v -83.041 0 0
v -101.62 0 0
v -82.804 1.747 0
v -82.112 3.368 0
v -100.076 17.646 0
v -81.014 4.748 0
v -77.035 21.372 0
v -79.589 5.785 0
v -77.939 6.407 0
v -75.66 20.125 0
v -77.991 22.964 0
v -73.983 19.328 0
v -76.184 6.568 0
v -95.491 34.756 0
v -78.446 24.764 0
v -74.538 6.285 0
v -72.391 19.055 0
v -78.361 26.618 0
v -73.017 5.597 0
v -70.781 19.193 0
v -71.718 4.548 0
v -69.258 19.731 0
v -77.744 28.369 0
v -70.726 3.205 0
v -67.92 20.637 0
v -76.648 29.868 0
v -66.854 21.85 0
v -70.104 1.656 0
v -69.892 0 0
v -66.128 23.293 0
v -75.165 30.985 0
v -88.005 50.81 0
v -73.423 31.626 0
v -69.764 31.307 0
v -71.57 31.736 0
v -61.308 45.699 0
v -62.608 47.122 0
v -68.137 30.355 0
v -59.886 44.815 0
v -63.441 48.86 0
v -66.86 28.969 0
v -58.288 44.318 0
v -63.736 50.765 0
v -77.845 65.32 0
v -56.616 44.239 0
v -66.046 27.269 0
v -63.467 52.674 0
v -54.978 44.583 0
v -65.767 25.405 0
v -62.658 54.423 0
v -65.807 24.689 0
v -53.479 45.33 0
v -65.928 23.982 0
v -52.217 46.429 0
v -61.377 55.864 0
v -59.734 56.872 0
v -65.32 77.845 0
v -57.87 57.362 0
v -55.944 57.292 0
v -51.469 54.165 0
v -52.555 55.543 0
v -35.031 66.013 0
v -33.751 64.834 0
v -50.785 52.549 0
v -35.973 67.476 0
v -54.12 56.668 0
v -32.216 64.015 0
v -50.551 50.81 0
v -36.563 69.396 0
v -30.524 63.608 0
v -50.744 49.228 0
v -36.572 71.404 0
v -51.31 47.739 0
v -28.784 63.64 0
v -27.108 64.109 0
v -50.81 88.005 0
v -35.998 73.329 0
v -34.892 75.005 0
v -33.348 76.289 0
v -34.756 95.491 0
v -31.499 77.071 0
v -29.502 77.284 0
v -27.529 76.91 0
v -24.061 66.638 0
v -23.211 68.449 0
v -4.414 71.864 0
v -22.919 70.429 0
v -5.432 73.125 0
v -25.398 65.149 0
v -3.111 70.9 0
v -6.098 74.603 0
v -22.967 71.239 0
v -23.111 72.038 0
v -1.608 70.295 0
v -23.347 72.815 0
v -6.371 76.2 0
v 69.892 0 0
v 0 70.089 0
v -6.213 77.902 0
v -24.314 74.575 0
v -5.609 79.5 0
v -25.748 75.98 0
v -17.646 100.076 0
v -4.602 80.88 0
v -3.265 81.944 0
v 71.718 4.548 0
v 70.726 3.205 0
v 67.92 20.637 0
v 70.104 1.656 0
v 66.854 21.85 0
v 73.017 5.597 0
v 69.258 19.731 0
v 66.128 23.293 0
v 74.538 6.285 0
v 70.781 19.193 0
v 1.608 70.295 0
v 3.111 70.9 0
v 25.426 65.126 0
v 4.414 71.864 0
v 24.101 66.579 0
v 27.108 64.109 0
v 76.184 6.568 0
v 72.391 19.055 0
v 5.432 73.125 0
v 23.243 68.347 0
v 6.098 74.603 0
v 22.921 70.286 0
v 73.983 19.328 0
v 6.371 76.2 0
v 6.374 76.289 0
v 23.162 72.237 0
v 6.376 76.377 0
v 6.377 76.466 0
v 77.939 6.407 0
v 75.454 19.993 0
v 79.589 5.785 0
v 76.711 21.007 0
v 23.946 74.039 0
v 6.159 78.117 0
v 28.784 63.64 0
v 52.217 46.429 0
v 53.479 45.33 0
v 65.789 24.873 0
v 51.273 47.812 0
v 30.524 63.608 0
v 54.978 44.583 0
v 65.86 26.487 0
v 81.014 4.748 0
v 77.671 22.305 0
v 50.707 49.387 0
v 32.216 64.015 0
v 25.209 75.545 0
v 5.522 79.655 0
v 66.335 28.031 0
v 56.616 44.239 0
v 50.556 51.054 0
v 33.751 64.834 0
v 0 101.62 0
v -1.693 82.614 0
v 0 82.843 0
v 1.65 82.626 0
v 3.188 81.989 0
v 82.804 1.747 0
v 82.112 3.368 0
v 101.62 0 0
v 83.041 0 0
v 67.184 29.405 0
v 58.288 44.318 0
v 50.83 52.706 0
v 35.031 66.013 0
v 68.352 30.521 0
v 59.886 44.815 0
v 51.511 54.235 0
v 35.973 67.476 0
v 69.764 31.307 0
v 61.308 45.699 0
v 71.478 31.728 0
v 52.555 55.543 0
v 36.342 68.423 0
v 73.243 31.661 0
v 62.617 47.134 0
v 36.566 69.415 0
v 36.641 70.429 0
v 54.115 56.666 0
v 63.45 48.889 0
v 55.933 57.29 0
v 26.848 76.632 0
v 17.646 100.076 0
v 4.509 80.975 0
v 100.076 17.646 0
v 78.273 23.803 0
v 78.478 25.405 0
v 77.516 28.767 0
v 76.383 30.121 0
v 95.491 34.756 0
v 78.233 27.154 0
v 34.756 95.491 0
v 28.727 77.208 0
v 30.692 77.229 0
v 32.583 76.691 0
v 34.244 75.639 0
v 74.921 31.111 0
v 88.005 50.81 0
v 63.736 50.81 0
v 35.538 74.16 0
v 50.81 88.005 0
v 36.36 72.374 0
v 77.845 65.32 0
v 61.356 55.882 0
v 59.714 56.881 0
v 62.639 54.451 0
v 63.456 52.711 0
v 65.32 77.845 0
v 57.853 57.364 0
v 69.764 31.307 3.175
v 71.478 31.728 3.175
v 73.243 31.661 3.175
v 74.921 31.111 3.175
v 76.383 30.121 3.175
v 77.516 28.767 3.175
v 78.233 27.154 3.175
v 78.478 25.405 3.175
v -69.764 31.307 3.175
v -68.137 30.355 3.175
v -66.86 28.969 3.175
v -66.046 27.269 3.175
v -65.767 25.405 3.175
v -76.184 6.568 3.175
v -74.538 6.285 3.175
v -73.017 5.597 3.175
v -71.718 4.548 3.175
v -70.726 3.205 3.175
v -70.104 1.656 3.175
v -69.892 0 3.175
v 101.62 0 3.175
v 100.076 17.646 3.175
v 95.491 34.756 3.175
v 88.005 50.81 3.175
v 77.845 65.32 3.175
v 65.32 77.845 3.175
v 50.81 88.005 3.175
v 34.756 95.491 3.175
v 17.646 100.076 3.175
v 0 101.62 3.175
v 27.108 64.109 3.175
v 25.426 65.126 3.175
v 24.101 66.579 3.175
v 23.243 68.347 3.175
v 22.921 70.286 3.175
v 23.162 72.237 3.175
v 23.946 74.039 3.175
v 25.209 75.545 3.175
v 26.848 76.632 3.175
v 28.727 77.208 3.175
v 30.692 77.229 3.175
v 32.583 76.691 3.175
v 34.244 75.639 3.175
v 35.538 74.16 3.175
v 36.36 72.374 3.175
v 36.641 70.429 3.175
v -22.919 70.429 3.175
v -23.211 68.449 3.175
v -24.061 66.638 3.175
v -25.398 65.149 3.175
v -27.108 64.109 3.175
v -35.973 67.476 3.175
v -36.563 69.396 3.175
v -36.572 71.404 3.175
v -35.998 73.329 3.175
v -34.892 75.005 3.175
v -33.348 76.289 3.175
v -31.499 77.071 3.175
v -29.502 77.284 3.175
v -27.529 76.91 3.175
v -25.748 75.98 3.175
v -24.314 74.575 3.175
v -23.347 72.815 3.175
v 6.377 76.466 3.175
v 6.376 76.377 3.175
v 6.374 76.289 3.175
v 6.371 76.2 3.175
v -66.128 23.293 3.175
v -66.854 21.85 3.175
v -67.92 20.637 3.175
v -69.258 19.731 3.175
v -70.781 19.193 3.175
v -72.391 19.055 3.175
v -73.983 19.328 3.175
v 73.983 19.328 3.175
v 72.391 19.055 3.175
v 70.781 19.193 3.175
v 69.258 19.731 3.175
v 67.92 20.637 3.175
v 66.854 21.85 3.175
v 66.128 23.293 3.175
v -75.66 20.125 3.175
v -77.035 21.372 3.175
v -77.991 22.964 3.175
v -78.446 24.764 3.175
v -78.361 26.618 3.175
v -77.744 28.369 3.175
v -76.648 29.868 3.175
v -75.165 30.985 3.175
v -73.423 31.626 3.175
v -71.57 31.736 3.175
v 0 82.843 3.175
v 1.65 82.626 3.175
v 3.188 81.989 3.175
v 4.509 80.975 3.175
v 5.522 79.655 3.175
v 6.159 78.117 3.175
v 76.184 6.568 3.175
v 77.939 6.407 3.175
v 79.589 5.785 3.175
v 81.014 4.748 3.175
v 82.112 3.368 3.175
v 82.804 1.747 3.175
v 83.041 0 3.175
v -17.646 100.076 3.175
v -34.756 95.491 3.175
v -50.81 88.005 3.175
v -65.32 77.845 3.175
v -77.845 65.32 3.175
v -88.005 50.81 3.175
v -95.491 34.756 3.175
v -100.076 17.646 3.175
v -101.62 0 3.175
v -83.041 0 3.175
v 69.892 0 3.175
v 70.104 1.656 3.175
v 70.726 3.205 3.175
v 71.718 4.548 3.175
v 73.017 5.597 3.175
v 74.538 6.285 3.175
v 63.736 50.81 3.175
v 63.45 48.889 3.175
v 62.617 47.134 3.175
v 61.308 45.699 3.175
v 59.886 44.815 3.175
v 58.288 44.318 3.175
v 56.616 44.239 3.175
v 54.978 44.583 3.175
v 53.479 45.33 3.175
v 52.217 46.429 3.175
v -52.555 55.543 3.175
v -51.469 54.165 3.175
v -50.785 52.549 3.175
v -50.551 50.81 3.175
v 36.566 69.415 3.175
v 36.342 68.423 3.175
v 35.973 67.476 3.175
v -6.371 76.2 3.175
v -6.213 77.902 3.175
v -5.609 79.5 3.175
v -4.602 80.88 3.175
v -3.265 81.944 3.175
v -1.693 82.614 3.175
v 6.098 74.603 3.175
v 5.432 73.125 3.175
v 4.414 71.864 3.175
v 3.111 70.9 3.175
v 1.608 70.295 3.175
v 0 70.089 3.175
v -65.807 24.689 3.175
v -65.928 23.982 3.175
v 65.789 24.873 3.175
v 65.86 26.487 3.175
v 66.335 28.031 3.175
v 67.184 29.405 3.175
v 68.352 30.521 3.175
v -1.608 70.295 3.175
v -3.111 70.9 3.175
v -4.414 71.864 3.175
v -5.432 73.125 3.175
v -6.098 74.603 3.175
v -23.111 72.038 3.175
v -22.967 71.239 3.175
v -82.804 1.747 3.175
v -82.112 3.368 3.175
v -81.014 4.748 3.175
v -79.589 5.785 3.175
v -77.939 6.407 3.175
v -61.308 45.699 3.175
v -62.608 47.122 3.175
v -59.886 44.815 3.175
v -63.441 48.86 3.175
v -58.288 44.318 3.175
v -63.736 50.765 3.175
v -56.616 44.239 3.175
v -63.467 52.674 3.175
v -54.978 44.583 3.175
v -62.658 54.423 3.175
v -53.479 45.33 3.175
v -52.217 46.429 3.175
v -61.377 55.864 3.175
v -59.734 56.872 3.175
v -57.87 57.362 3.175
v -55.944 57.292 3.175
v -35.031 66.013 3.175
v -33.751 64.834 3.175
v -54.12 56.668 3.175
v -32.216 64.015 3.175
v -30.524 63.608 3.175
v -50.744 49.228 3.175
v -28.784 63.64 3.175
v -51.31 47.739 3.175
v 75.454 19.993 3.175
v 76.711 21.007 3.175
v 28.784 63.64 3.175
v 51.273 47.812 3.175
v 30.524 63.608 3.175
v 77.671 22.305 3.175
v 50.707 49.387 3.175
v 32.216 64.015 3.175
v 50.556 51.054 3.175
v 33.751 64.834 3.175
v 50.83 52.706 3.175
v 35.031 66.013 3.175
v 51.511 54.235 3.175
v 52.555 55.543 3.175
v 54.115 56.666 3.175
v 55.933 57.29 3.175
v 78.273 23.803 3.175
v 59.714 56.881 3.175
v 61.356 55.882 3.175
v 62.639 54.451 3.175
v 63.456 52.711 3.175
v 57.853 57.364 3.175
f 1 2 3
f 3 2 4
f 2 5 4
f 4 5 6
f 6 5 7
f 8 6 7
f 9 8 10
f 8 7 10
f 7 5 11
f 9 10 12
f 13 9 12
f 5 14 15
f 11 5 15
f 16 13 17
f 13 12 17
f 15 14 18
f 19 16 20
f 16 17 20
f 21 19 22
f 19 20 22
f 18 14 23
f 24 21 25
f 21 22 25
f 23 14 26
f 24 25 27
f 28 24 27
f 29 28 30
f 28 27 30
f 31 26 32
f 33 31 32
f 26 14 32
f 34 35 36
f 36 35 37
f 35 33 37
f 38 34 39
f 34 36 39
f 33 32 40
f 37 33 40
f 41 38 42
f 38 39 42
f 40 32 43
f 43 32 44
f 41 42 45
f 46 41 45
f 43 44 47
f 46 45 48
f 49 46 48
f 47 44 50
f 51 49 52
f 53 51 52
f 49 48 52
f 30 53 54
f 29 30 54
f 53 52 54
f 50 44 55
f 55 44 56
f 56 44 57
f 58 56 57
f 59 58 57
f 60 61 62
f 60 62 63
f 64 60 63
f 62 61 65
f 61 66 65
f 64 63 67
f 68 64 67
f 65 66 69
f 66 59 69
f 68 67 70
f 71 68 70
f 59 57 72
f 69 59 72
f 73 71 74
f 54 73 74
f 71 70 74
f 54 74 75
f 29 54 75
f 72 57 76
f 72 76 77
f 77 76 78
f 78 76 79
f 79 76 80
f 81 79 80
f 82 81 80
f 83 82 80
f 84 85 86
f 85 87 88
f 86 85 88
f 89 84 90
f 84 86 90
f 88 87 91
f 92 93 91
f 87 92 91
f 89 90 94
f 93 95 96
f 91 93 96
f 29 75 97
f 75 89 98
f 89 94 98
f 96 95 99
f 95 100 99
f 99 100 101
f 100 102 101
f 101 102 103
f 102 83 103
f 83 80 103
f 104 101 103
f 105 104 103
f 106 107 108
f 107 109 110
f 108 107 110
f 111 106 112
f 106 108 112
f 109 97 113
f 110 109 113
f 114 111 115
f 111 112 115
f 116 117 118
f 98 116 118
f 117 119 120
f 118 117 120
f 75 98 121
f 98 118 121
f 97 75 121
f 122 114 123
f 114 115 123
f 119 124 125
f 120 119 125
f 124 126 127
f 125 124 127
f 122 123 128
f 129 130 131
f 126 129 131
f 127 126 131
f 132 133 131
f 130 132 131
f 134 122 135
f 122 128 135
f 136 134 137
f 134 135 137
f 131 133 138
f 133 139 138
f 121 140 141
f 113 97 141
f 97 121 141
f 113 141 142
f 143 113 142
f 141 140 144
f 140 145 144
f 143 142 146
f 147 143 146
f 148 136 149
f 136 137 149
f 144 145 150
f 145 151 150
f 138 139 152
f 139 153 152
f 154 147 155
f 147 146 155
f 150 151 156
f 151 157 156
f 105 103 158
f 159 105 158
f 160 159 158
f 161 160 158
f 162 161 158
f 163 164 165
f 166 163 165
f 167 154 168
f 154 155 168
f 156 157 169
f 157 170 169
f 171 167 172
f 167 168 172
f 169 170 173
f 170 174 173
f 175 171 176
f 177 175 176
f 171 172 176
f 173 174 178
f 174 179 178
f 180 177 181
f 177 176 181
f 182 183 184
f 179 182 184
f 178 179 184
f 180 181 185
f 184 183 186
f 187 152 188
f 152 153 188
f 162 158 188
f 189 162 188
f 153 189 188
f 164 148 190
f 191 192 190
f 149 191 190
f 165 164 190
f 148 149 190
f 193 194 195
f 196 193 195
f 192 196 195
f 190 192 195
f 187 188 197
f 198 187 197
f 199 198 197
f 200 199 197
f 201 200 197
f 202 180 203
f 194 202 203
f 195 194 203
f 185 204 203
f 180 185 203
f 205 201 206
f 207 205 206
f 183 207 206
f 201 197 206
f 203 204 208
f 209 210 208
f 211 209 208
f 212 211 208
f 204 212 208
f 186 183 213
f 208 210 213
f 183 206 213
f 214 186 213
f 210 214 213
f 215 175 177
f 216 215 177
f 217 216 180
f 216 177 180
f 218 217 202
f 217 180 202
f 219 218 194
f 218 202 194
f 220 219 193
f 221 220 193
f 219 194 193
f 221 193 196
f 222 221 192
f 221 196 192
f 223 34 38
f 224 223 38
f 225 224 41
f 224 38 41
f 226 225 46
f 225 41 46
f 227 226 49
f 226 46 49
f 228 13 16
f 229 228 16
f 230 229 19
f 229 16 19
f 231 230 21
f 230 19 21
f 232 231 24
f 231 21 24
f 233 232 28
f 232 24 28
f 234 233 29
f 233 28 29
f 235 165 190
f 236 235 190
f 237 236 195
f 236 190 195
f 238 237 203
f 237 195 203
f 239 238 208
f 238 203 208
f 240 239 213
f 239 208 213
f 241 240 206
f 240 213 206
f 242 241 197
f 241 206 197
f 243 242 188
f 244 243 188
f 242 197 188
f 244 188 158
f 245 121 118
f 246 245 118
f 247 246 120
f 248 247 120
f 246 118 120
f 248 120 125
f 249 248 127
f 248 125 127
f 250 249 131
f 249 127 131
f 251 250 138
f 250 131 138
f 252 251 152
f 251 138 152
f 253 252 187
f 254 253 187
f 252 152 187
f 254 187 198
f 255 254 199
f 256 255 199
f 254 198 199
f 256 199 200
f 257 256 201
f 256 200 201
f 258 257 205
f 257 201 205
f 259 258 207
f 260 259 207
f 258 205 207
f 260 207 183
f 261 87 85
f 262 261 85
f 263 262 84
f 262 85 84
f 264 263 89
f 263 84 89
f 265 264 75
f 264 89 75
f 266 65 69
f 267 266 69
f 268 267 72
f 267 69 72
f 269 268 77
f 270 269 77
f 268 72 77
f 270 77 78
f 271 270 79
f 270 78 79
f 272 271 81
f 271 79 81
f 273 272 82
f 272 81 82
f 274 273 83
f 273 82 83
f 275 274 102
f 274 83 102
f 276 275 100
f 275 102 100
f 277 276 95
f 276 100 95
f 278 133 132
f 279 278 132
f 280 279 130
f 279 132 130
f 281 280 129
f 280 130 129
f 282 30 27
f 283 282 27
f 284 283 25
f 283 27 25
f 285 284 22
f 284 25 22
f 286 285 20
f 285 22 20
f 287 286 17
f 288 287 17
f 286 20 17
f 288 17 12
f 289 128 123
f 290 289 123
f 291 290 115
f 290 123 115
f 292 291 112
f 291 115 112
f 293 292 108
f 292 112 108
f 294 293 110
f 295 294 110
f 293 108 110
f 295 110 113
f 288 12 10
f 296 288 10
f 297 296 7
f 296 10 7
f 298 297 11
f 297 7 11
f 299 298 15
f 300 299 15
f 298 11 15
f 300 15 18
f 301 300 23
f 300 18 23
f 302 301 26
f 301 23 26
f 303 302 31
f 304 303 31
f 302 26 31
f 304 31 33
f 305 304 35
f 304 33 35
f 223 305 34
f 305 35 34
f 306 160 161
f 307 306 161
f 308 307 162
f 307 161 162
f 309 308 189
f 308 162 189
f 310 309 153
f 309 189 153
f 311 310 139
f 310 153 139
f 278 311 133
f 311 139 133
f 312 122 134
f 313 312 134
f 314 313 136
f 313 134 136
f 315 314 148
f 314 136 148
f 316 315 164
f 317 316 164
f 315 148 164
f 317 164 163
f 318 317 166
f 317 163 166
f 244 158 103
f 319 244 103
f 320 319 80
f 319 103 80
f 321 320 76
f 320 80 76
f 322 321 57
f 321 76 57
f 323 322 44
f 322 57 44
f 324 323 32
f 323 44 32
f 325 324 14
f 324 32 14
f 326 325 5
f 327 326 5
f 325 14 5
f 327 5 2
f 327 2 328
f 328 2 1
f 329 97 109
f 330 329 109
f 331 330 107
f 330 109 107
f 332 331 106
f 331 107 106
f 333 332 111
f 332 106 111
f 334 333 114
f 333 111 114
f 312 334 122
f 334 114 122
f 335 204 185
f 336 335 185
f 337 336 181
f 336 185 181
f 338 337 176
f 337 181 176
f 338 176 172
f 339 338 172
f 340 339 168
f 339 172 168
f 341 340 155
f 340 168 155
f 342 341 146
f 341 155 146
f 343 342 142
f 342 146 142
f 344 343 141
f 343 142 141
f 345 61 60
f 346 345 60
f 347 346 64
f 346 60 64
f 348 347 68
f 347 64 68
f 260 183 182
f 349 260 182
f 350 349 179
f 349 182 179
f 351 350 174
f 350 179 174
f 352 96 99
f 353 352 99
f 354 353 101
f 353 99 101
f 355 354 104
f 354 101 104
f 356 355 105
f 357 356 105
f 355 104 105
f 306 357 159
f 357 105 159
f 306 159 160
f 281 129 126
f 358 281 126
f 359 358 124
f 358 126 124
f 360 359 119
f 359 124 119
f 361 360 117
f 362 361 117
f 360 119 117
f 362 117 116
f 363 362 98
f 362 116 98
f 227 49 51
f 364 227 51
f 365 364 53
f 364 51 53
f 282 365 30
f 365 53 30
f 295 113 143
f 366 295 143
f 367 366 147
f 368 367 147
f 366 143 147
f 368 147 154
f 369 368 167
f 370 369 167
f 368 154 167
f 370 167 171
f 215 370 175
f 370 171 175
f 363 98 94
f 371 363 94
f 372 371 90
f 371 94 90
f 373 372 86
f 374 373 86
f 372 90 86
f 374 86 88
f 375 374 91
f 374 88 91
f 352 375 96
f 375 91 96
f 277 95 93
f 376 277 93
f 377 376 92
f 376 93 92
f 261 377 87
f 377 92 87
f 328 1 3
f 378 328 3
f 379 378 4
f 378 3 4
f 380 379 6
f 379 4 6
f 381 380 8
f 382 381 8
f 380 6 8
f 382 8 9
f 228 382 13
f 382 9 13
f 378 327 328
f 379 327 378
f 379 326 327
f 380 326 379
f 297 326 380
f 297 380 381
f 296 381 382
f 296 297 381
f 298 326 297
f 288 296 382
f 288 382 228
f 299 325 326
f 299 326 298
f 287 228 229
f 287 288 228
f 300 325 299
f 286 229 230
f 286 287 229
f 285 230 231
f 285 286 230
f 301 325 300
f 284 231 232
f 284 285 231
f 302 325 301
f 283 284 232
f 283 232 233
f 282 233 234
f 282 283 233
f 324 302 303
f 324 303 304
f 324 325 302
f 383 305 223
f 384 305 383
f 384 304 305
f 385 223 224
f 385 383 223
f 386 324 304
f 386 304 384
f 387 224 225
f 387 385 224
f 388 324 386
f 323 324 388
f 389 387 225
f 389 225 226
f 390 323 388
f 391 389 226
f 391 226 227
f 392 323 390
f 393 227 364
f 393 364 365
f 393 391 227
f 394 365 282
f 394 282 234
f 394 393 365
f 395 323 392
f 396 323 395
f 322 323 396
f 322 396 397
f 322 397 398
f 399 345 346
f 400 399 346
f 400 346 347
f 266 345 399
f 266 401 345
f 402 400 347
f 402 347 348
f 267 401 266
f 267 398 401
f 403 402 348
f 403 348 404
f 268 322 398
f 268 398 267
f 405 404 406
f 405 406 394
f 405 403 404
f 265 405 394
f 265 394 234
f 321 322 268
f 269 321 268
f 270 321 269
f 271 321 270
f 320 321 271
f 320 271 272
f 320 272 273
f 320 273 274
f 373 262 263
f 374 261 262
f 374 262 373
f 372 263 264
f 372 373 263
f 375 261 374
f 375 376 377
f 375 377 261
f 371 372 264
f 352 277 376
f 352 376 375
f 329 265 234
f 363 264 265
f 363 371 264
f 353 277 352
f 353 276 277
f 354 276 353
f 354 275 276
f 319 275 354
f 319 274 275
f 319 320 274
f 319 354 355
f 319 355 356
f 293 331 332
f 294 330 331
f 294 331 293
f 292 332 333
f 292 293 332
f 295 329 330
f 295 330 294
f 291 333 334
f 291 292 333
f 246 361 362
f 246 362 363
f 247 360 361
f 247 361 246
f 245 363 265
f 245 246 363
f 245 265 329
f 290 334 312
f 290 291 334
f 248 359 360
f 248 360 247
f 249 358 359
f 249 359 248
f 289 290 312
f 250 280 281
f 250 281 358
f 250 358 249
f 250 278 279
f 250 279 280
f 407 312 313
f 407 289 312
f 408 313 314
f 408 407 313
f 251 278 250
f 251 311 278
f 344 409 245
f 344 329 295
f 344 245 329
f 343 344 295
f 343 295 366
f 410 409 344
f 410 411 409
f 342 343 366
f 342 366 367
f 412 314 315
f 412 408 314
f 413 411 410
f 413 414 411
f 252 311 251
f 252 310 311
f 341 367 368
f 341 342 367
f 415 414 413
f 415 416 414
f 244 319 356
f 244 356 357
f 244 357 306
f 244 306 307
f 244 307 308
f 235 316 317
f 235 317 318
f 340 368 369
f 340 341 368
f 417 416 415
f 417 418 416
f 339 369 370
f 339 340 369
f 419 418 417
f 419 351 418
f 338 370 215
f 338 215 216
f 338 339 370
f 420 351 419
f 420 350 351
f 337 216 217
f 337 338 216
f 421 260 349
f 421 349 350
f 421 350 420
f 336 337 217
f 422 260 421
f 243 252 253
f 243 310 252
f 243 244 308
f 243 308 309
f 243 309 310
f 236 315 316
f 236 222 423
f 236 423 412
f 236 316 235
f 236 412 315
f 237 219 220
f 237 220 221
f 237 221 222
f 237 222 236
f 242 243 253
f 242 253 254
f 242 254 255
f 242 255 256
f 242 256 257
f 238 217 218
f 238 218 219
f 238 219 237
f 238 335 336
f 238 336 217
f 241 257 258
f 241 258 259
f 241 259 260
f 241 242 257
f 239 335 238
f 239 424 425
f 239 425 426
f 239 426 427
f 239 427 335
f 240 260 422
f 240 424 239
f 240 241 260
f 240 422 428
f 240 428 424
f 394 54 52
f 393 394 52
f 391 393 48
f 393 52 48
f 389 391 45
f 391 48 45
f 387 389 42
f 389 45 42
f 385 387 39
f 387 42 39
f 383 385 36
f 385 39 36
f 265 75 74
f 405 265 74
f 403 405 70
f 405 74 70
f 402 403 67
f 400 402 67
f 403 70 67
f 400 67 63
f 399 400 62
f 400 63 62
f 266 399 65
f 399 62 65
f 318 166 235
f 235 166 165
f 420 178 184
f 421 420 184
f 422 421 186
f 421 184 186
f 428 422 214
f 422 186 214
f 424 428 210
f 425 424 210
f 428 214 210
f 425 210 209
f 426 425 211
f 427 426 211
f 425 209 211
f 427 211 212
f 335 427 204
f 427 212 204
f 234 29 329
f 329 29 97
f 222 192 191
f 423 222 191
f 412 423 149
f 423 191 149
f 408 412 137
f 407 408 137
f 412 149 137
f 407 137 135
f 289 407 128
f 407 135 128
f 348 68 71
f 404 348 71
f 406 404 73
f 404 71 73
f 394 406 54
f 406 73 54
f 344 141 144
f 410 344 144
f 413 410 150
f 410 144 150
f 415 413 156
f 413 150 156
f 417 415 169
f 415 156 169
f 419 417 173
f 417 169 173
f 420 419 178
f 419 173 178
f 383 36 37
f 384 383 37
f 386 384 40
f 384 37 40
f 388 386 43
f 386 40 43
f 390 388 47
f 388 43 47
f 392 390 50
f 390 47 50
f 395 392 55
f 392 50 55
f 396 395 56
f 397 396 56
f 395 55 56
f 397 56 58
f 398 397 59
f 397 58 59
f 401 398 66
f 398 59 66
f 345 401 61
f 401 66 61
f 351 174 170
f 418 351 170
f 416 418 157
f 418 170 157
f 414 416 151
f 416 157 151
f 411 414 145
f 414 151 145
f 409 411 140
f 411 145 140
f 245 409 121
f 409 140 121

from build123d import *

# Parameters (mm, degrees)
F1_DEPTH = 3.175


with BuildPart() as f1:
    # F0 (on Top) → F1 (new body)
    with BuildSketch(Plane.XY):
        with BuildLine():
            Line((0, 82.8428900972), (0, 101.6198892983))
            ThreePointArc((0, 101.6198892983), (-71.8561128263, 71.8561128263), (-101.6198892983, 0))
            Line((-101.6198892983, 0), (-83.0405046204, 0))
            ThreePointArc((-83.0405046204, 0), (-81.0138961368, 4.747652407), (-76.1835112753, 6.5682916938))
            ThreePointArc((-76.1835112753, 6.5682916938), (-75.3538778245, 12.9947275008), (-73.9831338439, 19.3278491468))
            ThreePointArc((-73.9831338439, 19.3278491468), (-78.1170647151, 27.5165370514), (-69.7636527981, 31.306590269))
            ThreePointArc((-69.7636527981, 31.306590269), (-65.9297039839, 38.7342739522), (-61.3079271878, 45.6991018505))
            ThreePointArc((-61.3079271878, 45.6991018505), (-62.070439488, 55.1904658501), (-52.5550284868, 55.5431258281))
            ThreePointArc((-52.5550284868, 55.5431258281), (-44.6644810596, 62.0657230497), (-35.973351178, 67.4758316068))
            ThreePointArc((-35.973351178, 67.4758316068), (-32.4523110588, 76.7481303158), (-23.3473151394, 72.8146463412))
            ThreePointArc((-23.3473151394, 72.8146463412), (-14.9553750219, 74.9893766074), (-6.3712090649, 76.200246332))
            ThreePointArc((-6.3712090649, 76.200246332), (-4.6020924898, 80.8801750033), (0, 82.8428900972))
        make_face()
        with BuildLine():
            Line((83.0405046204, 0), (101.6198892983, 0))
            ThreePointArc((101.6198892983, 0), (71.8561128263, 71.8561128263), (0, 101.6198892983))
            Line((0, 101.6198892983), (0, 82.8428900972))
            ThreePointArc((0, 82.8428900972), (4.509046567, 80.9751818558), (6.3767548084, 76.4661352888))
            ThreePointArc((6.3767548084, 76.4661352888), (6.3753682218, 76.3331618962), (6.3712090649, 76.200246332))
            ThreePointArc((6.3712090649, 76.200246332), (14.9553750219, 74.9893766074), (23.3473151394, 72.8146463412))
            ThreePointArc((23.3473151394, 72.8146463412), (30.9922218938, 77.1819499048), (36.641312364, 70.4287494368))
            ThreePointArc((36.641312364, 70.4287494368), (36.4722388851, 68.9149879086), (35.973351178, 67.4758316068))
            ThreePointArc((35.973351178, 67.4758316068), (44.6644810596, 62.0657230497), (52.5550284868, 55.5431258281))
            ThreePointArc((52.5550284868, 55.5431258281), (59.71374592, 56.8808501906), (63.7362883578, 50.8099446492))
            ThreePointArc((63.7362883578, 50.8099446492), (63.0983300746, 47.9807375127), (61.3079271878, 45.6991018505))
            ThreePointArc((61.3079271878, 45.6991018505), (65.9297039839, 38.7342739522), (69.7636527981, 31.306590269))
            ThreePointArc((69.7636527981, 31.306590269), (75.6863195554, 30.6673507833), (78.478089889, 25.4049723246))
            ThreePointArc((78.478089889, 25.4049723246), (77.232242702, 21.625552529), (73.9831338439, 19.3278491468))
            ThreePointArc((73.9831338439, 19.3278491468), (75.3538778245, 12.9947275008), (76.1835112753, 6.5682916938))
            ThreePointArc((76.1835112753, 6.5682916938), (81.0138961368, 4.747652407), (83.0405046204, 0))
        make_face()
        with BuildLine():
            ThreePointArc((6.3712090649, 76.200246332), (4.4140397145, 71.864042799), (0, 70.0893804804))
            Line((0, 70.0893804804), (0, 0))
            Line((0, 0), (27.1081153594, 64.1093685577))
            ThreePointArc((27.1081153594, 64.1093685577), (23.4817449036, 67.7077241487), (23.3473151394, 72.8146463412))
            ThreePointArc((23.3473151394, 72.8146463412), (14.9553750219, 74.9893766074), (6.3712090649, 76.200246332))
        make_face()
        with BuildLine():
            ThreePointArc((0, 70.0893804804), (-4.4140397145, 71.864042799), (-6.3712090649, 76.200246332))
            ThreePointArc((-6.3712090649, 76.200246332), (-14.9553750219, 74.9893766074), (-23.3473151394, 72.8146463412))
            ThreePointArc((-23.3473151394, 72.8146463412), (-23.0270127411, 71.6407581215), (-22.9191140542, 70.4287494368))
            ThreePointArc((-22.9191140542, 70.4287494368), (-24.0614629124, 66.6378950928), (-27.1081153594, 64.1093685577))
            Line((-27.1081153594, 64.1093685577), (0, 0))
            Line((0, 0), (0, 70.0893804804))
        make_face()
        with BuildLine():
            Line((52.217256626, 46.4294234482), (0, 0))
            Line((0, 0), (66.1279660789, 23.2934075977))
            ThreePointArc((66.1279660789, 23.2934075977), (66.3348002352, 28.0309350677), (69.7636527981, 31.306590269))
            ThreePointArc((69.7636527981, 31.306590269), (65.9297039839, 38.7342739522), (61.3079271878, 45.6991018505))
            ThreePointArc((61.3079271878, 45.6991018505), (56.6159288766, 44.2386760913), (52.217256626, 46.4294234482))
        make_face()
        with BuildLine():
            ThreePointArc((69.8917659573, 0), (71.7184828819, 4.547760848), (76.1835112753, 6.5682916938))
            ThreePointArc((76.1835112753, 6.5682916938), (75.3538778245, 12.9947275008), (73.9831338439, 19.3278491468))
            ThreePointArc((73.9831338439, 19.3278491468), (69.2582948104, 19.7313872539), (66.1279660789, 23.2934075977))
            Line((66.1279660789, 23.2934075977), (0, 0))
            Line((0, 0), (69.8917659573, 0))
        make_face()
        with BuildLine():
            Line((-52.217256626, 46.4294234482), (0, 0))
            Line((0, 0), (-27.1081153594, 64.1093685577))
            ThreePointArc((-27.1081153594, 64.1093685577), (-32.215926502, 64.014547821), (-35.973351178, 67.4758316068))
            ThreePointArc((-35.973351178, 67.4758316068), (-44.6644810596, 62.0657230497), (-52.5550284868, 55.5431258281))
            ThreePointArc((-52.5550284868, 55.5431258281), (-51.0729425155, 53.3798425122), (-50.5514077561, 50.8099446492))
            ThreePointArc((-50.5514077561, 50.8099446492), (-50.9819275359, 48.4666553772), (-52.217256626, 46.4294234482))
        make_face()
        with BuildLine():
            Line((-66.1279660789, 23.2934075977), (0, 0))
            Line((0, 0), (-52.217256626, 46.4294234482))
            ThreePointArc((-52.217256626, 46.4294234482), (-56.6159288766, 44.2386760913), (-61.3079271878, 45.6991018505))
            ThreePointArc((-61.3079271878, 45.6991018505), (-65.9297039839, 38.7342739522), (-69.7636527981, 31.306590269))
            ThreePointArc((-69.7636527981, 31.306590269), (-66.8601369383, 28.968776483), (-65.7669409051, 25.4049723246))
            ThreePointArc((-65.7669409051, 25.4049723246), (-65.8578473348, 24.3338695317), (-66.1279660789, 23.2934075977))
        make_face()
        with BuildLine():
            ThreePointArc((-73.9831338439, 19.3278491468), (-75.3538778245, 12.9947275008), (-76.1835112753, 6.5682916938))
            ThreePointArc((-76.1835112753, 6.5682916938), (-71.7184828819, 4.547760848), (-69.8917659573, 0))
            Line((-69.8917659573, 0), (0, 0))
            Line((0, 0), (-66.1279660789, 23.2934075977))
            ThreePointArc((-66.1279660789, 23.2934075977), (-69.2582948104, 19.7313872539), (-73.9831338439, 19.3278491468))
        make_face()
        with BuildLine():
            Line((27.1081153594, 64.1093685577), (0, 0))
            Line((0, 0), (52.217256626, 46.4294234482))
            ThreePointArc((52.217256626, 46.4294234482), (50.5559307535, 51.0541059125), (52.5550284868, 55.5431258281))
            ThreePointArc((52.5550284868, 55.5431258281), (44.6644810596, 62.0657230497), (35.973351178, 67.4758316068))
            ThreePointArc((35.973351178, 67.4758316068), (32.215926502, 64.014547821), (27.1081153594, 64.1093685577))
        make_face()
    extrude(amount=F1_DEPTH)


solid = f1.part
